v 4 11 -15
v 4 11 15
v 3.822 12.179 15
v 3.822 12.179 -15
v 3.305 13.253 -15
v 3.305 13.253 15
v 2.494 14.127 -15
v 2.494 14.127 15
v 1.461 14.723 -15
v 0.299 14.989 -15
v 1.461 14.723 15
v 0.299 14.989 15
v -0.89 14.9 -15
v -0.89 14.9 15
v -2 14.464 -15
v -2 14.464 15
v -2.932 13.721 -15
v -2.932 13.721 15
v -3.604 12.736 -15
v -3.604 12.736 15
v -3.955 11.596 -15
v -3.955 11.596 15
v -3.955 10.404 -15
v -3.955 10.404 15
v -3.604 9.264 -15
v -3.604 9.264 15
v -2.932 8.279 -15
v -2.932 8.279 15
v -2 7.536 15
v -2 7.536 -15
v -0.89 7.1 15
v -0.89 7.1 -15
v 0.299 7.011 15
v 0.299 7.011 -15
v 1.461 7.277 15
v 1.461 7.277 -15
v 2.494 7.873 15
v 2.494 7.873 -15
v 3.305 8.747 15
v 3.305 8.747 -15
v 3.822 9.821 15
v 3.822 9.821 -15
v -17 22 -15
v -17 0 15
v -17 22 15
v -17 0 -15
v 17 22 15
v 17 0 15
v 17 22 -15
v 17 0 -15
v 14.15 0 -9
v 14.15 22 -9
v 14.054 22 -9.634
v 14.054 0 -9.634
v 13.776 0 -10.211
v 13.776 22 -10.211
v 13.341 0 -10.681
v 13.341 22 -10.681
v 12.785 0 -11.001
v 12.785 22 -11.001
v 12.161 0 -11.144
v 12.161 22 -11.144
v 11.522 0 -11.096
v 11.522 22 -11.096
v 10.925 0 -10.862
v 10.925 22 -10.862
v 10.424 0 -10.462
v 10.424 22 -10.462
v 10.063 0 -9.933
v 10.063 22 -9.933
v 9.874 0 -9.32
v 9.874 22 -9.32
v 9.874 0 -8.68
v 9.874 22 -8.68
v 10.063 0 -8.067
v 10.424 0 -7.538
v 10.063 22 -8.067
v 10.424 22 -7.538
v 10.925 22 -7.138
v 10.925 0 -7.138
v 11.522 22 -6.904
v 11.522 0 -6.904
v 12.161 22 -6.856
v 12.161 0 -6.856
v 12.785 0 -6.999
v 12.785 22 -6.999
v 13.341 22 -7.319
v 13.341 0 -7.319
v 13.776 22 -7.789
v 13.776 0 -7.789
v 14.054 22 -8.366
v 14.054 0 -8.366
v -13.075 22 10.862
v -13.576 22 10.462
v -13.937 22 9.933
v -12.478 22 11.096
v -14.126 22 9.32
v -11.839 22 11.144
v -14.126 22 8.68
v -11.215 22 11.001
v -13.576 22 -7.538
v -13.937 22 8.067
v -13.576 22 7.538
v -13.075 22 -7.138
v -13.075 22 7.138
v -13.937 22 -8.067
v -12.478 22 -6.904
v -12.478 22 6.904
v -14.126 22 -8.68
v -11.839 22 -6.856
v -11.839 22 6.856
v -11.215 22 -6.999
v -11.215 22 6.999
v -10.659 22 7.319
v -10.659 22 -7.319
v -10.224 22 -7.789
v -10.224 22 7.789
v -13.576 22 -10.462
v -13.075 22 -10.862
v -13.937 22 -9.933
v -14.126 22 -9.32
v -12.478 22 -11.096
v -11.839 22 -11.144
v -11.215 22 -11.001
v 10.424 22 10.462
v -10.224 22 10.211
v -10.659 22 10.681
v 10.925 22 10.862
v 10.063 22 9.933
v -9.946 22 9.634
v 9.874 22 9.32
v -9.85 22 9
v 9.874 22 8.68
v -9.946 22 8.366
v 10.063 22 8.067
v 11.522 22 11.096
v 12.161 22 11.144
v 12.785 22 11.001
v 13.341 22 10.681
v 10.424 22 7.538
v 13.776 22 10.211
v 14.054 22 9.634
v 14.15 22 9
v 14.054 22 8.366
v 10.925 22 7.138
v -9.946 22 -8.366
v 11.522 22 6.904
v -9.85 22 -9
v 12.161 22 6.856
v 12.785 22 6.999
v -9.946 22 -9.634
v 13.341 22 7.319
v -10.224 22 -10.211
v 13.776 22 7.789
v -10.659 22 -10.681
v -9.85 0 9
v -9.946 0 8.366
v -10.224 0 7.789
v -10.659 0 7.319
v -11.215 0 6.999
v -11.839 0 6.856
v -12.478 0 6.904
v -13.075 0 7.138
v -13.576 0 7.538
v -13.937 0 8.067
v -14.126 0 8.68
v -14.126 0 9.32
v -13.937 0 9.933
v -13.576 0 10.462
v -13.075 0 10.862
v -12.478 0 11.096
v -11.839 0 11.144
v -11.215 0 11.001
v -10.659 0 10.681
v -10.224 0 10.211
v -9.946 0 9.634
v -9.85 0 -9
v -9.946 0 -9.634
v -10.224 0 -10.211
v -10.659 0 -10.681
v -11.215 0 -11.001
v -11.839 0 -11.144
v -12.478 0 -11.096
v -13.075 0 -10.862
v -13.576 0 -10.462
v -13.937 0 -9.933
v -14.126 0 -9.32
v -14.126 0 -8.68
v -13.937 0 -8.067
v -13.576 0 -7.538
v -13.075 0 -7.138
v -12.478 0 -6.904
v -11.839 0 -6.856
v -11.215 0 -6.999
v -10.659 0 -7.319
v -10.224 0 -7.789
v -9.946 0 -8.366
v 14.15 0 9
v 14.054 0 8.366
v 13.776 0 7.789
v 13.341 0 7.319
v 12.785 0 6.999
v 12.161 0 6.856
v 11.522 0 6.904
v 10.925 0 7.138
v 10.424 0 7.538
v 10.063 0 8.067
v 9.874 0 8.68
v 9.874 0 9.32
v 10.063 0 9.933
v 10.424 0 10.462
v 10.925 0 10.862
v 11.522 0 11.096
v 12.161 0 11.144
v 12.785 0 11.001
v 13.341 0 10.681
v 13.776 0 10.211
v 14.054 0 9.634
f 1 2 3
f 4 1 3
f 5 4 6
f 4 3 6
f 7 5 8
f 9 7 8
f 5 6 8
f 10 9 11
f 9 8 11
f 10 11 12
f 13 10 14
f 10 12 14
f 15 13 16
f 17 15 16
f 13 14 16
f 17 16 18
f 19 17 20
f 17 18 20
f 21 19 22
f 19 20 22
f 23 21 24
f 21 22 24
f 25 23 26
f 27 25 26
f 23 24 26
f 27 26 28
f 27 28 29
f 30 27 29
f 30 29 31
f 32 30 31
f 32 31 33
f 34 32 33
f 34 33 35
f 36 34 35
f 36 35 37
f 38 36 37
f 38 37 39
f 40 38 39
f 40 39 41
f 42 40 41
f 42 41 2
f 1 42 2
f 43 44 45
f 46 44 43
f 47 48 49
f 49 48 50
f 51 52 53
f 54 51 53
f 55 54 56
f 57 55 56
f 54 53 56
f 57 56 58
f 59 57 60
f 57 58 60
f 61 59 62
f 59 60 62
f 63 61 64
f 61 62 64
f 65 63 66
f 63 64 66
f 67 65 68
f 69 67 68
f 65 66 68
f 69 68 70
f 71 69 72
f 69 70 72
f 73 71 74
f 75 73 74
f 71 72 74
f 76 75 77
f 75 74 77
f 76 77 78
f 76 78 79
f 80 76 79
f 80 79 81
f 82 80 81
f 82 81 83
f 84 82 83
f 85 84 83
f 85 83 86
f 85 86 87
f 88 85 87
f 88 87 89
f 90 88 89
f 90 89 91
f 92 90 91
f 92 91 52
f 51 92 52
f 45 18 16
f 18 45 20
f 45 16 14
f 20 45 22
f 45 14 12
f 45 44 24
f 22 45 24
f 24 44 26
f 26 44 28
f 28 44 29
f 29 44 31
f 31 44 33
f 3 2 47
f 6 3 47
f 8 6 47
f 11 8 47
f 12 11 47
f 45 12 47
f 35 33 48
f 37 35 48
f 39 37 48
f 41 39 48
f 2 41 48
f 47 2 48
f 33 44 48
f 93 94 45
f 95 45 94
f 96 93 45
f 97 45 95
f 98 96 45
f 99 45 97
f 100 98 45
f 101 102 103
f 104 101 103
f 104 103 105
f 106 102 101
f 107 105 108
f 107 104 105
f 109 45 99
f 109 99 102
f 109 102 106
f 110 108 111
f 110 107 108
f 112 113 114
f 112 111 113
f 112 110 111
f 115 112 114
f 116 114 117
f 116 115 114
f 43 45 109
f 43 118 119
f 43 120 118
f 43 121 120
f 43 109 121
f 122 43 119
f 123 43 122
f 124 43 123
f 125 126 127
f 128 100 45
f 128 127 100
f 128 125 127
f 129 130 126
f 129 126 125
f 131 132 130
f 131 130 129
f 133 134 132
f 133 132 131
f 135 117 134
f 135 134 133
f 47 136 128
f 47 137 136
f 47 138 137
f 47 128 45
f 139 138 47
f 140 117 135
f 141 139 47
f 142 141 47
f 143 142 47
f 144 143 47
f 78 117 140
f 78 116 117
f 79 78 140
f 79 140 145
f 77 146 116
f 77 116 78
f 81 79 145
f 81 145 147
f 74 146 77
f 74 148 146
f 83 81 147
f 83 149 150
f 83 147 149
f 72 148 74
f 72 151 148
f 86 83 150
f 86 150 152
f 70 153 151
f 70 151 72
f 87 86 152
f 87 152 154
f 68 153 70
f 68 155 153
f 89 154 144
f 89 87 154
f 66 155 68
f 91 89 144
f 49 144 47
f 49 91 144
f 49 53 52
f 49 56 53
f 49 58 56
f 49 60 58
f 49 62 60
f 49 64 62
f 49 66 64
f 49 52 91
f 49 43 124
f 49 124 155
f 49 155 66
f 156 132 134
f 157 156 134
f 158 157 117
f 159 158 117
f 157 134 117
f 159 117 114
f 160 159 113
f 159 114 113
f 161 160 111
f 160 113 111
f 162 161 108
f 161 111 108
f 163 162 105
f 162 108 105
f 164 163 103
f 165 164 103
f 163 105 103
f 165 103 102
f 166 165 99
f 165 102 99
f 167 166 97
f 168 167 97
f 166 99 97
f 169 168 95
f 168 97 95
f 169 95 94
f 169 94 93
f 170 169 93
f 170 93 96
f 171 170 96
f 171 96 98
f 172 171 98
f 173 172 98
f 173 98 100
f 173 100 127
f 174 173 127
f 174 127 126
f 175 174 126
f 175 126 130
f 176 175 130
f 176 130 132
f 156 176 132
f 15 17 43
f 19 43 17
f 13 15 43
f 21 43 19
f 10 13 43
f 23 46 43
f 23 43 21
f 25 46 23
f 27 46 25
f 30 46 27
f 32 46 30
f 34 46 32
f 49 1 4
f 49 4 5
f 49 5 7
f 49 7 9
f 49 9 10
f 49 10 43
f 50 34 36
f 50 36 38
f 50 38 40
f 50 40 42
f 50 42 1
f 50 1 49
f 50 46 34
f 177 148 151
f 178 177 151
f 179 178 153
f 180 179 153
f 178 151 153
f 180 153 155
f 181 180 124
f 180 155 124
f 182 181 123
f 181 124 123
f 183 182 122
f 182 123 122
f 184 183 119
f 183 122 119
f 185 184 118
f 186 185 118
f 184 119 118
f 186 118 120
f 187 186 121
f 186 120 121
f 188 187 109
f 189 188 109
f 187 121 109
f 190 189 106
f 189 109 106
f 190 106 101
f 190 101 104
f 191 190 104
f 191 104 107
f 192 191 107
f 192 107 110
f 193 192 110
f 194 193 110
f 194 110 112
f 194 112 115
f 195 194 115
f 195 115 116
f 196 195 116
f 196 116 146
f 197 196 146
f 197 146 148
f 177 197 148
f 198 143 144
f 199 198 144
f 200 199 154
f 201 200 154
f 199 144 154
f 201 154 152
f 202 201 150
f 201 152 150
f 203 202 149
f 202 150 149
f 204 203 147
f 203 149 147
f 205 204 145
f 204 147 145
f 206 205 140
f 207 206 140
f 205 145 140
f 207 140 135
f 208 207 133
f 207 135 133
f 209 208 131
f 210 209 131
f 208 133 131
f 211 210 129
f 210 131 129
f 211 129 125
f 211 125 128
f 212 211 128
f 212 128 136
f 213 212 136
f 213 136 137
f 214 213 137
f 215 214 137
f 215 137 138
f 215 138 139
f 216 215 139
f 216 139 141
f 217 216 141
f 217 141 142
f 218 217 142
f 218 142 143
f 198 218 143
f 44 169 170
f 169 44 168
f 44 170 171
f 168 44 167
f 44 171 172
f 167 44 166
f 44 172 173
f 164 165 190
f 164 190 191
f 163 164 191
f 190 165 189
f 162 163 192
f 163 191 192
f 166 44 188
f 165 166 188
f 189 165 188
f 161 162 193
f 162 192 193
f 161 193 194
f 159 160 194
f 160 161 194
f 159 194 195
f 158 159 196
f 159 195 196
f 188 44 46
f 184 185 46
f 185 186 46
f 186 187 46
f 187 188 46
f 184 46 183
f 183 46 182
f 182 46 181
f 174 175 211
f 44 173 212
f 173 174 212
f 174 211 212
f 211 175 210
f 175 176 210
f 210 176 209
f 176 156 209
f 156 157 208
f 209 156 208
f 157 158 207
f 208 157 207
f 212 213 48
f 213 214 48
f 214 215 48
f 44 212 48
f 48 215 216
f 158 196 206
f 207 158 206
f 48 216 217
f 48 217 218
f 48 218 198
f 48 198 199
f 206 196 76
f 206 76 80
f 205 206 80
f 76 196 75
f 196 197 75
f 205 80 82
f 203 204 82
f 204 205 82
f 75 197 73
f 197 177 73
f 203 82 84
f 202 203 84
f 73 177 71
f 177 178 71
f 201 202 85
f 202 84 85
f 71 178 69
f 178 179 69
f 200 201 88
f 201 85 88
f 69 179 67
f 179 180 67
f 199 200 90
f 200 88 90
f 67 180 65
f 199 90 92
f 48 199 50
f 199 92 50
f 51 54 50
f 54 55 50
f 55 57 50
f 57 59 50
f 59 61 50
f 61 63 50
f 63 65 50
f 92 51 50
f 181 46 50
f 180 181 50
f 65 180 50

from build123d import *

# Parameters (mm, degrees)
SKETCH_1_W          = 34
SKETCH_1_H          = 30
EXTRUDE_1_DEPTH     = 22
SKETCH_2_R          = 2.15
CUT_EXTRUDE_1_DEPTH = 23
SKETCH_3_R          = 4
CUT_EXTRUDE_2_DEPTH = 31


with BuildPart() as part:
    # 草图1 → 凸台-拉伸1 (new body)
    with BuildSketch(Plane(origin=(0, 0, 0), x_dir=(1, 0, 0), z_dir=(0, 1, 0))):
        Rectangle(SKETCH_1_W, SKETCH_1_H)
    extrude(amount=EXTRUDE_1_DEPTH)

    # 草图2 → 切除-拉伸1 (cut, through all)
    with BuildSketch(Plane(origin=(0, 22, 0), x_dir=(1, 0, 0), z_dir=(0, 1, 0))):
        with Locations((-12, 9)):
            Circle(SKETCH_2_R)
        with Locations((12, 9)):
            Circle(SKETCH_2_R)
        with Locations((12, -9)):
            Circle(SKETCH_2_R)
        with Locations((-12, -9)):
            Circle(SKETCH_2_R)
    extrude(amount=-CUT_EXTRUDE_1_DEPTH, mode=Mode.SUBTRACT)

    # 草图3 → 切除-拉伸2 (cut, through all)
    with BuildSketch(Plane.XY.offset(15)):
        with Locations((0, 11)):
            Circle(SKETCH_3_R)
    extrude(amount=-CUT_EXTRUDE_2_DEPTH, mode=Mode.SUBTRACT)


solid = part.part
